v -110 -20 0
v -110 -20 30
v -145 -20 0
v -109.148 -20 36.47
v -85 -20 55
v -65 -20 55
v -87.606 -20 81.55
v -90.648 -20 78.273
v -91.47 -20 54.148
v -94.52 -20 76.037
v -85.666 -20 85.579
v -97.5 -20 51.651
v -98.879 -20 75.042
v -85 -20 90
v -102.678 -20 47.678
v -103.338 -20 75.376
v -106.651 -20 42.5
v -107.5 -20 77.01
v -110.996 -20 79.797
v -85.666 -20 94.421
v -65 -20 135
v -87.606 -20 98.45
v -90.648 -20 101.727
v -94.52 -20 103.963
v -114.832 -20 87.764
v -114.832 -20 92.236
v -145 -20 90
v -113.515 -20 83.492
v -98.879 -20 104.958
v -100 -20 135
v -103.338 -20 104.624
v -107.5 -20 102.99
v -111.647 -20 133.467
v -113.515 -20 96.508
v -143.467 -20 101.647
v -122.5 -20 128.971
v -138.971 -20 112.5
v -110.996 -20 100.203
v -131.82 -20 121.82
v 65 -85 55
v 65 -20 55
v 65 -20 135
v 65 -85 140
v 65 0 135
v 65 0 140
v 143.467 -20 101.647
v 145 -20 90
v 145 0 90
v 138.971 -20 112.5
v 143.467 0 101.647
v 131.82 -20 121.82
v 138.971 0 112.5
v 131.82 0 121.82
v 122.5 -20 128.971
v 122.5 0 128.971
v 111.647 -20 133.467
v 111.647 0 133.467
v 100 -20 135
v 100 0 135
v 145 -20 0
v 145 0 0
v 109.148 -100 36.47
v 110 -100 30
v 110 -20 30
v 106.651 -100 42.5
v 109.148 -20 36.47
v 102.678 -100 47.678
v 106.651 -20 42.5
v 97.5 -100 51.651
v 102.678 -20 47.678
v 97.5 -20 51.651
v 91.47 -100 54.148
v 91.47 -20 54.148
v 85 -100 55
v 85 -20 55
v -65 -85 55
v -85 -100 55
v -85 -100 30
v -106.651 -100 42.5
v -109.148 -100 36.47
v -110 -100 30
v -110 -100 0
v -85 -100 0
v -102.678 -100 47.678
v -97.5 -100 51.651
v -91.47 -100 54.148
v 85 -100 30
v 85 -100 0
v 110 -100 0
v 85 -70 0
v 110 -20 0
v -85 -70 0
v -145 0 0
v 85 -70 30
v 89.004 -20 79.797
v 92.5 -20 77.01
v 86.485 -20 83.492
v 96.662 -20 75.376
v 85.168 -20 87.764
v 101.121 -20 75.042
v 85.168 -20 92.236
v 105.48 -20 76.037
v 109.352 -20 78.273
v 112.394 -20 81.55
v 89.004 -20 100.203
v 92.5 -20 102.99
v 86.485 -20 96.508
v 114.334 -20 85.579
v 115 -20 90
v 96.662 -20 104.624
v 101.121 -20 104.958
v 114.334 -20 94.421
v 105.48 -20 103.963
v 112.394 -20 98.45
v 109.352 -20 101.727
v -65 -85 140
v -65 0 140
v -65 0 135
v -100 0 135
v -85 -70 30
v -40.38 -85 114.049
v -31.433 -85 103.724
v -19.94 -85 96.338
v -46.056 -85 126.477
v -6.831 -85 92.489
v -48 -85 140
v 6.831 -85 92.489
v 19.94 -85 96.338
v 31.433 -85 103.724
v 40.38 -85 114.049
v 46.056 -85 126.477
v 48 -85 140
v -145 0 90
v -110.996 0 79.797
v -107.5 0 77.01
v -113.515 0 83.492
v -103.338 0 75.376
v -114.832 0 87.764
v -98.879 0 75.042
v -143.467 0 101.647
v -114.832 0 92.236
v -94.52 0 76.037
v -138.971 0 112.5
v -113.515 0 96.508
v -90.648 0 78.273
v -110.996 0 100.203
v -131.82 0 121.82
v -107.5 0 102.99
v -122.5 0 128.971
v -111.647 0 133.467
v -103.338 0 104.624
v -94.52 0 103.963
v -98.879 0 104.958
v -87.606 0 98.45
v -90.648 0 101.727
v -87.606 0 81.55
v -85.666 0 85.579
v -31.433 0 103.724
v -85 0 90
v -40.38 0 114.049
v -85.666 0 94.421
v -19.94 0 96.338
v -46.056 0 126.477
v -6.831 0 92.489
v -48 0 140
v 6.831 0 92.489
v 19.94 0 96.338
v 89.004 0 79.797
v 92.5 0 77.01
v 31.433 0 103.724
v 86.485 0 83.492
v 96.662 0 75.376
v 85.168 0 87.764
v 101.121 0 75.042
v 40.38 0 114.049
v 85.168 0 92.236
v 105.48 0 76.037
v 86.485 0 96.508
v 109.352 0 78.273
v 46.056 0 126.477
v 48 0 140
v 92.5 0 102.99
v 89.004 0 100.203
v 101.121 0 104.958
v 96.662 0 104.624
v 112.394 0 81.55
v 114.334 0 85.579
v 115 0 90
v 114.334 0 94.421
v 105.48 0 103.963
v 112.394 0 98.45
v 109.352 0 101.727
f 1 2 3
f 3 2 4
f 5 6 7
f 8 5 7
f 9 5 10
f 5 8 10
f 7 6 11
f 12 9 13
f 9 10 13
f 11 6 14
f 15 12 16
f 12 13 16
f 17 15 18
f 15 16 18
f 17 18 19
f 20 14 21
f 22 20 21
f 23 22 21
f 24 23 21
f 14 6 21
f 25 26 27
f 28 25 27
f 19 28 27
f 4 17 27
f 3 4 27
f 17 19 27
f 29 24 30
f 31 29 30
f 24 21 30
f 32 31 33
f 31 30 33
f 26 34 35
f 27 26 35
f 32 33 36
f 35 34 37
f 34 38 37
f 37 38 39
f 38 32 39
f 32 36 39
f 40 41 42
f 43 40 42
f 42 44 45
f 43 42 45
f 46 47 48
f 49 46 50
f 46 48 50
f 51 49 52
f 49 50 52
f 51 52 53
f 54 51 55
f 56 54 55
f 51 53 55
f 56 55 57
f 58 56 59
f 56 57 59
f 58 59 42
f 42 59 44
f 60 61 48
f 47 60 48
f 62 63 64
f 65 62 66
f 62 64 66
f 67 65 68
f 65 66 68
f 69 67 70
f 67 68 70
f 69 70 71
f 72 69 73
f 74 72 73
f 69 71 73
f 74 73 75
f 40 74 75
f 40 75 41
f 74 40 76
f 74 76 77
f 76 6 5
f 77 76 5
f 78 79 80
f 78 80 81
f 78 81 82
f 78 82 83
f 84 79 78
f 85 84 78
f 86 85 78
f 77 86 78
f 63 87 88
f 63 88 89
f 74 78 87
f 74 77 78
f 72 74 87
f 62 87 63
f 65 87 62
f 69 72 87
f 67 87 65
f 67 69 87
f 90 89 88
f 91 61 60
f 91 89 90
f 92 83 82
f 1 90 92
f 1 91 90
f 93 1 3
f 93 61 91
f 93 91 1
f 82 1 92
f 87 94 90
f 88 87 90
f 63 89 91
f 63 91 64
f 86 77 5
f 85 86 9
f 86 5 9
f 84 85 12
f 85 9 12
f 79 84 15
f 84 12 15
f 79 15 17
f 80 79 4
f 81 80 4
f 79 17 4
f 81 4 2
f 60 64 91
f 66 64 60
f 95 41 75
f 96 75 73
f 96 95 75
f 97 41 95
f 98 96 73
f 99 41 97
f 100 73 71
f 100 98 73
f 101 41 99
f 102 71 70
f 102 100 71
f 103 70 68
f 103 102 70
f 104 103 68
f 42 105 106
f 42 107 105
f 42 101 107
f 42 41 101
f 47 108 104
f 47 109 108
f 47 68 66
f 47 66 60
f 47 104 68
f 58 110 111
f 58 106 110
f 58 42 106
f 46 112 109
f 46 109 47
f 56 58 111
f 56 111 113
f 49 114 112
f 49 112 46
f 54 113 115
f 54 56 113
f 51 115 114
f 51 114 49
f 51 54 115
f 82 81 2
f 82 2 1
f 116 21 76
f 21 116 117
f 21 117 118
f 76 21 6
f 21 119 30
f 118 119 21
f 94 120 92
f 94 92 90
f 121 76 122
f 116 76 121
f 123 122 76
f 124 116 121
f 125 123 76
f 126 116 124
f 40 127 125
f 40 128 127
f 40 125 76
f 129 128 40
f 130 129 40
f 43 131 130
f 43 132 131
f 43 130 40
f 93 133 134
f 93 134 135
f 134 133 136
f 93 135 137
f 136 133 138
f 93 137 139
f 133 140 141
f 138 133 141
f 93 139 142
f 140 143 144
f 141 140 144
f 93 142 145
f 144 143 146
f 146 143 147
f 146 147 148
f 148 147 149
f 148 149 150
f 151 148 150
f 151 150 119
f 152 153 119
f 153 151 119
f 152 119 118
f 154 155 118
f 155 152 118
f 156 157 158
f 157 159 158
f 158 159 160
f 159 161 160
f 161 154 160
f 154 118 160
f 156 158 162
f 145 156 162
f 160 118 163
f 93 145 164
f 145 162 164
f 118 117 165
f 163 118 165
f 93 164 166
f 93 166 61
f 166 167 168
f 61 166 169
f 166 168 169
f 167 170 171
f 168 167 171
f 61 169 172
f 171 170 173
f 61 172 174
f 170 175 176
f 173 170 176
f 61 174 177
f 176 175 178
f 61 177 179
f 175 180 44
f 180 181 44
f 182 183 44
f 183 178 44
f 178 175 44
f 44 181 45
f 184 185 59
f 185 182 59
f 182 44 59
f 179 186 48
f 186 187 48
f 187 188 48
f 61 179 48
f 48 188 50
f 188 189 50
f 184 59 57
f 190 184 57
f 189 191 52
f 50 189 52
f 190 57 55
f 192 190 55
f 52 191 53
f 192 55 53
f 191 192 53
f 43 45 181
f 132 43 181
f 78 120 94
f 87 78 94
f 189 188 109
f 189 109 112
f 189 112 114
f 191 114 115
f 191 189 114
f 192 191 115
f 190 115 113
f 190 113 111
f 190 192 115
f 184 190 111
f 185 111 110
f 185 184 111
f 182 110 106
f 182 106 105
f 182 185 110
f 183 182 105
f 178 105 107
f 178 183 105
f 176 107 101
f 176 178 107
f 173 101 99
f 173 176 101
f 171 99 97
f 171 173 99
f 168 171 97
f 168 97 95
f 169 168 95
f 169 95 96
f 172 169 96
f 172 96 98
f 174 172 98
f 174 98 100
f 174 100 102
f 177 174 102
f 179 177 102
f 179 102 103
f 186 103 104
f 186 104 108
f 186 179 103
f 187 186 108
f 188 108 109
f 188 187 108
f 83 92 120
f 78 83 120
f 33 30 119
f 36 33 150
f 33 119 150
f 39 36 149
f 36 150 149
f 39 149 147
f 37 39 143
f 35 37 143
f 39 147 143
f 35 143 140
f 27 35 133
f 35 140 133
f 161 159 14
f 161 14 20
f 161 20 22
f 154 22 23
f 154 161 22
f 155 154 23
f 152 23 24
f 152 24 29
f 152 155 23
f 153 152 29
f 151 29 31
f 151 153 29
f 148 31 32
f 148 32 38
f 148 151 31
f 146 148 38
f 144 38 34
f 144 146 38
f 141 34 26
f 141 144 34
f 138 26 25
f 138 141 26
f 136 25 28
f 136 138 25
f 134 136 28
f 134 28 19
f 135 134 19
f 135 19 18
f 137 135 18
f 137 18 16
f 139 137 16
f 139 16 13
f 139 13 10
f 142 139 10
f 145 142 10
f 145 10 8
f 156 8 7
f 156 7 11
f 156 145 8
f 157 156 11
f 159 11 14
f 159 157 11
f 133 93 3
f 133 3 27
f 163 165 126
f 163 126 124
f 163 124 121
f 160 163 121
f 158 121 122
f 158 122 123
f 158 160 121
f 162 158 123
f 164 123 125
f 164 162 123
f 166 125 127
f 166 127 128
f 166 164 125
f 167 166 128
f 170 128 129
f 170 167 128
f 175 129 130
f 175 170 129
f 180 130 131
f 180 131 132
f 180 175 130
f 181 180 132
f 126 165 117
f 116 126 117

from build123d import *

# Parameters (mm, degrees)
PAD002_DEPTH = 85
PAD001_DEPTH = 100
SKETCH_W     = 170
SKETCH_H     = 30
PAD_DEPTH    = 70
SKETCH003_R  = 15
PAD003_DEPTH = 20


with BuildPart() as pad002:
    # Sketch002 → Pad002 (new body)
    with BuildSketch(Plane.XZ):
        with BuildLine():
            Line((-48, 140), (-65, 140))
            Line((-65, 140), (-65, 55))
            Line((-65, 55), (65, 55))
            Line((65, 55), (65, 140))
            Line((65, 140), (48, 140))
            ThreePointArc((-48, 140), (0, 92), (48, 140))
        make_face()
    extrude(amount=PAD002_DEPTH)


with BuildPart() as pad001:
    # Sketch001 → Pad001 (new body)
    with BuildSketch(Plane.XZ):
        with BuildLine():
            Line((-85, 0), (-85, 30))
            Line((-85, 30), (85, 30))
            Line((85, 30), (85, 0))
            Line((85, 0), (110, 0))
            Line((110, 0), (110, 30))
            ThreePointArc((110, 30), (102.67767, 47.67767), (85, 55))
            Line((85, 55), (-85, 55))
            ThreePointArc((-85, 55), (-102.67767, 47.67767), (-110, 30))
            Line((-110, 30), (-110, 0))
            Line((-110, 0), (-85, 0))
        make_face()
    extrude(amount=PAD001_DEPTH)


with BuildPart() as pad:
    # Sketch → Pad (new body)
    with BuildSketch(Plane.XZ):
        with Locations((0, 15)):
            Rectangle(SKETCH_W, SKETCH_H)
    extrude(amount=PAD_DEPTH)


with BuildPart() as fusion:
    # Sketch003 → Pad003 (new body)
    with BuildSketch(Plane.XZ):
        with BuildLine():
            Line((65, 0), (145, 0))
            Line((145, 0), (145, 90))
            ThreePointArc((145, 90), (131.819805, 121.819805), (100, 135))
            Line((100, 135), (65, 135))
            Line((65, 135), (65, 0))
        make_face()
        with Locations((100, 90)):
            Circle(SKETCH003_R, mode=Mode.SUBTRACT)
        with BuildLine():
            Line((-65, 0), (-145, 0))
            Line((-145, 0), (-145, 90))
            ThreePointArc((-100, 135), (-131.819805, 121.819805), (-145, 90))
            Line((-100, 135), (-65, 135))
            Line((-65, 135), (-65, 0))
        make_face()
        with Locations((-100, 90)):
            Circle(SKETCH003_R, mode=Mode.SUBTRACT)
    extrude(amount=PAD003_DEPTH)

    # Fusion: union Pad002, Pad001, Pad
    add(pad002.part)
    add(pad001.part)
    add(pad.part)


solid = fusion.part
